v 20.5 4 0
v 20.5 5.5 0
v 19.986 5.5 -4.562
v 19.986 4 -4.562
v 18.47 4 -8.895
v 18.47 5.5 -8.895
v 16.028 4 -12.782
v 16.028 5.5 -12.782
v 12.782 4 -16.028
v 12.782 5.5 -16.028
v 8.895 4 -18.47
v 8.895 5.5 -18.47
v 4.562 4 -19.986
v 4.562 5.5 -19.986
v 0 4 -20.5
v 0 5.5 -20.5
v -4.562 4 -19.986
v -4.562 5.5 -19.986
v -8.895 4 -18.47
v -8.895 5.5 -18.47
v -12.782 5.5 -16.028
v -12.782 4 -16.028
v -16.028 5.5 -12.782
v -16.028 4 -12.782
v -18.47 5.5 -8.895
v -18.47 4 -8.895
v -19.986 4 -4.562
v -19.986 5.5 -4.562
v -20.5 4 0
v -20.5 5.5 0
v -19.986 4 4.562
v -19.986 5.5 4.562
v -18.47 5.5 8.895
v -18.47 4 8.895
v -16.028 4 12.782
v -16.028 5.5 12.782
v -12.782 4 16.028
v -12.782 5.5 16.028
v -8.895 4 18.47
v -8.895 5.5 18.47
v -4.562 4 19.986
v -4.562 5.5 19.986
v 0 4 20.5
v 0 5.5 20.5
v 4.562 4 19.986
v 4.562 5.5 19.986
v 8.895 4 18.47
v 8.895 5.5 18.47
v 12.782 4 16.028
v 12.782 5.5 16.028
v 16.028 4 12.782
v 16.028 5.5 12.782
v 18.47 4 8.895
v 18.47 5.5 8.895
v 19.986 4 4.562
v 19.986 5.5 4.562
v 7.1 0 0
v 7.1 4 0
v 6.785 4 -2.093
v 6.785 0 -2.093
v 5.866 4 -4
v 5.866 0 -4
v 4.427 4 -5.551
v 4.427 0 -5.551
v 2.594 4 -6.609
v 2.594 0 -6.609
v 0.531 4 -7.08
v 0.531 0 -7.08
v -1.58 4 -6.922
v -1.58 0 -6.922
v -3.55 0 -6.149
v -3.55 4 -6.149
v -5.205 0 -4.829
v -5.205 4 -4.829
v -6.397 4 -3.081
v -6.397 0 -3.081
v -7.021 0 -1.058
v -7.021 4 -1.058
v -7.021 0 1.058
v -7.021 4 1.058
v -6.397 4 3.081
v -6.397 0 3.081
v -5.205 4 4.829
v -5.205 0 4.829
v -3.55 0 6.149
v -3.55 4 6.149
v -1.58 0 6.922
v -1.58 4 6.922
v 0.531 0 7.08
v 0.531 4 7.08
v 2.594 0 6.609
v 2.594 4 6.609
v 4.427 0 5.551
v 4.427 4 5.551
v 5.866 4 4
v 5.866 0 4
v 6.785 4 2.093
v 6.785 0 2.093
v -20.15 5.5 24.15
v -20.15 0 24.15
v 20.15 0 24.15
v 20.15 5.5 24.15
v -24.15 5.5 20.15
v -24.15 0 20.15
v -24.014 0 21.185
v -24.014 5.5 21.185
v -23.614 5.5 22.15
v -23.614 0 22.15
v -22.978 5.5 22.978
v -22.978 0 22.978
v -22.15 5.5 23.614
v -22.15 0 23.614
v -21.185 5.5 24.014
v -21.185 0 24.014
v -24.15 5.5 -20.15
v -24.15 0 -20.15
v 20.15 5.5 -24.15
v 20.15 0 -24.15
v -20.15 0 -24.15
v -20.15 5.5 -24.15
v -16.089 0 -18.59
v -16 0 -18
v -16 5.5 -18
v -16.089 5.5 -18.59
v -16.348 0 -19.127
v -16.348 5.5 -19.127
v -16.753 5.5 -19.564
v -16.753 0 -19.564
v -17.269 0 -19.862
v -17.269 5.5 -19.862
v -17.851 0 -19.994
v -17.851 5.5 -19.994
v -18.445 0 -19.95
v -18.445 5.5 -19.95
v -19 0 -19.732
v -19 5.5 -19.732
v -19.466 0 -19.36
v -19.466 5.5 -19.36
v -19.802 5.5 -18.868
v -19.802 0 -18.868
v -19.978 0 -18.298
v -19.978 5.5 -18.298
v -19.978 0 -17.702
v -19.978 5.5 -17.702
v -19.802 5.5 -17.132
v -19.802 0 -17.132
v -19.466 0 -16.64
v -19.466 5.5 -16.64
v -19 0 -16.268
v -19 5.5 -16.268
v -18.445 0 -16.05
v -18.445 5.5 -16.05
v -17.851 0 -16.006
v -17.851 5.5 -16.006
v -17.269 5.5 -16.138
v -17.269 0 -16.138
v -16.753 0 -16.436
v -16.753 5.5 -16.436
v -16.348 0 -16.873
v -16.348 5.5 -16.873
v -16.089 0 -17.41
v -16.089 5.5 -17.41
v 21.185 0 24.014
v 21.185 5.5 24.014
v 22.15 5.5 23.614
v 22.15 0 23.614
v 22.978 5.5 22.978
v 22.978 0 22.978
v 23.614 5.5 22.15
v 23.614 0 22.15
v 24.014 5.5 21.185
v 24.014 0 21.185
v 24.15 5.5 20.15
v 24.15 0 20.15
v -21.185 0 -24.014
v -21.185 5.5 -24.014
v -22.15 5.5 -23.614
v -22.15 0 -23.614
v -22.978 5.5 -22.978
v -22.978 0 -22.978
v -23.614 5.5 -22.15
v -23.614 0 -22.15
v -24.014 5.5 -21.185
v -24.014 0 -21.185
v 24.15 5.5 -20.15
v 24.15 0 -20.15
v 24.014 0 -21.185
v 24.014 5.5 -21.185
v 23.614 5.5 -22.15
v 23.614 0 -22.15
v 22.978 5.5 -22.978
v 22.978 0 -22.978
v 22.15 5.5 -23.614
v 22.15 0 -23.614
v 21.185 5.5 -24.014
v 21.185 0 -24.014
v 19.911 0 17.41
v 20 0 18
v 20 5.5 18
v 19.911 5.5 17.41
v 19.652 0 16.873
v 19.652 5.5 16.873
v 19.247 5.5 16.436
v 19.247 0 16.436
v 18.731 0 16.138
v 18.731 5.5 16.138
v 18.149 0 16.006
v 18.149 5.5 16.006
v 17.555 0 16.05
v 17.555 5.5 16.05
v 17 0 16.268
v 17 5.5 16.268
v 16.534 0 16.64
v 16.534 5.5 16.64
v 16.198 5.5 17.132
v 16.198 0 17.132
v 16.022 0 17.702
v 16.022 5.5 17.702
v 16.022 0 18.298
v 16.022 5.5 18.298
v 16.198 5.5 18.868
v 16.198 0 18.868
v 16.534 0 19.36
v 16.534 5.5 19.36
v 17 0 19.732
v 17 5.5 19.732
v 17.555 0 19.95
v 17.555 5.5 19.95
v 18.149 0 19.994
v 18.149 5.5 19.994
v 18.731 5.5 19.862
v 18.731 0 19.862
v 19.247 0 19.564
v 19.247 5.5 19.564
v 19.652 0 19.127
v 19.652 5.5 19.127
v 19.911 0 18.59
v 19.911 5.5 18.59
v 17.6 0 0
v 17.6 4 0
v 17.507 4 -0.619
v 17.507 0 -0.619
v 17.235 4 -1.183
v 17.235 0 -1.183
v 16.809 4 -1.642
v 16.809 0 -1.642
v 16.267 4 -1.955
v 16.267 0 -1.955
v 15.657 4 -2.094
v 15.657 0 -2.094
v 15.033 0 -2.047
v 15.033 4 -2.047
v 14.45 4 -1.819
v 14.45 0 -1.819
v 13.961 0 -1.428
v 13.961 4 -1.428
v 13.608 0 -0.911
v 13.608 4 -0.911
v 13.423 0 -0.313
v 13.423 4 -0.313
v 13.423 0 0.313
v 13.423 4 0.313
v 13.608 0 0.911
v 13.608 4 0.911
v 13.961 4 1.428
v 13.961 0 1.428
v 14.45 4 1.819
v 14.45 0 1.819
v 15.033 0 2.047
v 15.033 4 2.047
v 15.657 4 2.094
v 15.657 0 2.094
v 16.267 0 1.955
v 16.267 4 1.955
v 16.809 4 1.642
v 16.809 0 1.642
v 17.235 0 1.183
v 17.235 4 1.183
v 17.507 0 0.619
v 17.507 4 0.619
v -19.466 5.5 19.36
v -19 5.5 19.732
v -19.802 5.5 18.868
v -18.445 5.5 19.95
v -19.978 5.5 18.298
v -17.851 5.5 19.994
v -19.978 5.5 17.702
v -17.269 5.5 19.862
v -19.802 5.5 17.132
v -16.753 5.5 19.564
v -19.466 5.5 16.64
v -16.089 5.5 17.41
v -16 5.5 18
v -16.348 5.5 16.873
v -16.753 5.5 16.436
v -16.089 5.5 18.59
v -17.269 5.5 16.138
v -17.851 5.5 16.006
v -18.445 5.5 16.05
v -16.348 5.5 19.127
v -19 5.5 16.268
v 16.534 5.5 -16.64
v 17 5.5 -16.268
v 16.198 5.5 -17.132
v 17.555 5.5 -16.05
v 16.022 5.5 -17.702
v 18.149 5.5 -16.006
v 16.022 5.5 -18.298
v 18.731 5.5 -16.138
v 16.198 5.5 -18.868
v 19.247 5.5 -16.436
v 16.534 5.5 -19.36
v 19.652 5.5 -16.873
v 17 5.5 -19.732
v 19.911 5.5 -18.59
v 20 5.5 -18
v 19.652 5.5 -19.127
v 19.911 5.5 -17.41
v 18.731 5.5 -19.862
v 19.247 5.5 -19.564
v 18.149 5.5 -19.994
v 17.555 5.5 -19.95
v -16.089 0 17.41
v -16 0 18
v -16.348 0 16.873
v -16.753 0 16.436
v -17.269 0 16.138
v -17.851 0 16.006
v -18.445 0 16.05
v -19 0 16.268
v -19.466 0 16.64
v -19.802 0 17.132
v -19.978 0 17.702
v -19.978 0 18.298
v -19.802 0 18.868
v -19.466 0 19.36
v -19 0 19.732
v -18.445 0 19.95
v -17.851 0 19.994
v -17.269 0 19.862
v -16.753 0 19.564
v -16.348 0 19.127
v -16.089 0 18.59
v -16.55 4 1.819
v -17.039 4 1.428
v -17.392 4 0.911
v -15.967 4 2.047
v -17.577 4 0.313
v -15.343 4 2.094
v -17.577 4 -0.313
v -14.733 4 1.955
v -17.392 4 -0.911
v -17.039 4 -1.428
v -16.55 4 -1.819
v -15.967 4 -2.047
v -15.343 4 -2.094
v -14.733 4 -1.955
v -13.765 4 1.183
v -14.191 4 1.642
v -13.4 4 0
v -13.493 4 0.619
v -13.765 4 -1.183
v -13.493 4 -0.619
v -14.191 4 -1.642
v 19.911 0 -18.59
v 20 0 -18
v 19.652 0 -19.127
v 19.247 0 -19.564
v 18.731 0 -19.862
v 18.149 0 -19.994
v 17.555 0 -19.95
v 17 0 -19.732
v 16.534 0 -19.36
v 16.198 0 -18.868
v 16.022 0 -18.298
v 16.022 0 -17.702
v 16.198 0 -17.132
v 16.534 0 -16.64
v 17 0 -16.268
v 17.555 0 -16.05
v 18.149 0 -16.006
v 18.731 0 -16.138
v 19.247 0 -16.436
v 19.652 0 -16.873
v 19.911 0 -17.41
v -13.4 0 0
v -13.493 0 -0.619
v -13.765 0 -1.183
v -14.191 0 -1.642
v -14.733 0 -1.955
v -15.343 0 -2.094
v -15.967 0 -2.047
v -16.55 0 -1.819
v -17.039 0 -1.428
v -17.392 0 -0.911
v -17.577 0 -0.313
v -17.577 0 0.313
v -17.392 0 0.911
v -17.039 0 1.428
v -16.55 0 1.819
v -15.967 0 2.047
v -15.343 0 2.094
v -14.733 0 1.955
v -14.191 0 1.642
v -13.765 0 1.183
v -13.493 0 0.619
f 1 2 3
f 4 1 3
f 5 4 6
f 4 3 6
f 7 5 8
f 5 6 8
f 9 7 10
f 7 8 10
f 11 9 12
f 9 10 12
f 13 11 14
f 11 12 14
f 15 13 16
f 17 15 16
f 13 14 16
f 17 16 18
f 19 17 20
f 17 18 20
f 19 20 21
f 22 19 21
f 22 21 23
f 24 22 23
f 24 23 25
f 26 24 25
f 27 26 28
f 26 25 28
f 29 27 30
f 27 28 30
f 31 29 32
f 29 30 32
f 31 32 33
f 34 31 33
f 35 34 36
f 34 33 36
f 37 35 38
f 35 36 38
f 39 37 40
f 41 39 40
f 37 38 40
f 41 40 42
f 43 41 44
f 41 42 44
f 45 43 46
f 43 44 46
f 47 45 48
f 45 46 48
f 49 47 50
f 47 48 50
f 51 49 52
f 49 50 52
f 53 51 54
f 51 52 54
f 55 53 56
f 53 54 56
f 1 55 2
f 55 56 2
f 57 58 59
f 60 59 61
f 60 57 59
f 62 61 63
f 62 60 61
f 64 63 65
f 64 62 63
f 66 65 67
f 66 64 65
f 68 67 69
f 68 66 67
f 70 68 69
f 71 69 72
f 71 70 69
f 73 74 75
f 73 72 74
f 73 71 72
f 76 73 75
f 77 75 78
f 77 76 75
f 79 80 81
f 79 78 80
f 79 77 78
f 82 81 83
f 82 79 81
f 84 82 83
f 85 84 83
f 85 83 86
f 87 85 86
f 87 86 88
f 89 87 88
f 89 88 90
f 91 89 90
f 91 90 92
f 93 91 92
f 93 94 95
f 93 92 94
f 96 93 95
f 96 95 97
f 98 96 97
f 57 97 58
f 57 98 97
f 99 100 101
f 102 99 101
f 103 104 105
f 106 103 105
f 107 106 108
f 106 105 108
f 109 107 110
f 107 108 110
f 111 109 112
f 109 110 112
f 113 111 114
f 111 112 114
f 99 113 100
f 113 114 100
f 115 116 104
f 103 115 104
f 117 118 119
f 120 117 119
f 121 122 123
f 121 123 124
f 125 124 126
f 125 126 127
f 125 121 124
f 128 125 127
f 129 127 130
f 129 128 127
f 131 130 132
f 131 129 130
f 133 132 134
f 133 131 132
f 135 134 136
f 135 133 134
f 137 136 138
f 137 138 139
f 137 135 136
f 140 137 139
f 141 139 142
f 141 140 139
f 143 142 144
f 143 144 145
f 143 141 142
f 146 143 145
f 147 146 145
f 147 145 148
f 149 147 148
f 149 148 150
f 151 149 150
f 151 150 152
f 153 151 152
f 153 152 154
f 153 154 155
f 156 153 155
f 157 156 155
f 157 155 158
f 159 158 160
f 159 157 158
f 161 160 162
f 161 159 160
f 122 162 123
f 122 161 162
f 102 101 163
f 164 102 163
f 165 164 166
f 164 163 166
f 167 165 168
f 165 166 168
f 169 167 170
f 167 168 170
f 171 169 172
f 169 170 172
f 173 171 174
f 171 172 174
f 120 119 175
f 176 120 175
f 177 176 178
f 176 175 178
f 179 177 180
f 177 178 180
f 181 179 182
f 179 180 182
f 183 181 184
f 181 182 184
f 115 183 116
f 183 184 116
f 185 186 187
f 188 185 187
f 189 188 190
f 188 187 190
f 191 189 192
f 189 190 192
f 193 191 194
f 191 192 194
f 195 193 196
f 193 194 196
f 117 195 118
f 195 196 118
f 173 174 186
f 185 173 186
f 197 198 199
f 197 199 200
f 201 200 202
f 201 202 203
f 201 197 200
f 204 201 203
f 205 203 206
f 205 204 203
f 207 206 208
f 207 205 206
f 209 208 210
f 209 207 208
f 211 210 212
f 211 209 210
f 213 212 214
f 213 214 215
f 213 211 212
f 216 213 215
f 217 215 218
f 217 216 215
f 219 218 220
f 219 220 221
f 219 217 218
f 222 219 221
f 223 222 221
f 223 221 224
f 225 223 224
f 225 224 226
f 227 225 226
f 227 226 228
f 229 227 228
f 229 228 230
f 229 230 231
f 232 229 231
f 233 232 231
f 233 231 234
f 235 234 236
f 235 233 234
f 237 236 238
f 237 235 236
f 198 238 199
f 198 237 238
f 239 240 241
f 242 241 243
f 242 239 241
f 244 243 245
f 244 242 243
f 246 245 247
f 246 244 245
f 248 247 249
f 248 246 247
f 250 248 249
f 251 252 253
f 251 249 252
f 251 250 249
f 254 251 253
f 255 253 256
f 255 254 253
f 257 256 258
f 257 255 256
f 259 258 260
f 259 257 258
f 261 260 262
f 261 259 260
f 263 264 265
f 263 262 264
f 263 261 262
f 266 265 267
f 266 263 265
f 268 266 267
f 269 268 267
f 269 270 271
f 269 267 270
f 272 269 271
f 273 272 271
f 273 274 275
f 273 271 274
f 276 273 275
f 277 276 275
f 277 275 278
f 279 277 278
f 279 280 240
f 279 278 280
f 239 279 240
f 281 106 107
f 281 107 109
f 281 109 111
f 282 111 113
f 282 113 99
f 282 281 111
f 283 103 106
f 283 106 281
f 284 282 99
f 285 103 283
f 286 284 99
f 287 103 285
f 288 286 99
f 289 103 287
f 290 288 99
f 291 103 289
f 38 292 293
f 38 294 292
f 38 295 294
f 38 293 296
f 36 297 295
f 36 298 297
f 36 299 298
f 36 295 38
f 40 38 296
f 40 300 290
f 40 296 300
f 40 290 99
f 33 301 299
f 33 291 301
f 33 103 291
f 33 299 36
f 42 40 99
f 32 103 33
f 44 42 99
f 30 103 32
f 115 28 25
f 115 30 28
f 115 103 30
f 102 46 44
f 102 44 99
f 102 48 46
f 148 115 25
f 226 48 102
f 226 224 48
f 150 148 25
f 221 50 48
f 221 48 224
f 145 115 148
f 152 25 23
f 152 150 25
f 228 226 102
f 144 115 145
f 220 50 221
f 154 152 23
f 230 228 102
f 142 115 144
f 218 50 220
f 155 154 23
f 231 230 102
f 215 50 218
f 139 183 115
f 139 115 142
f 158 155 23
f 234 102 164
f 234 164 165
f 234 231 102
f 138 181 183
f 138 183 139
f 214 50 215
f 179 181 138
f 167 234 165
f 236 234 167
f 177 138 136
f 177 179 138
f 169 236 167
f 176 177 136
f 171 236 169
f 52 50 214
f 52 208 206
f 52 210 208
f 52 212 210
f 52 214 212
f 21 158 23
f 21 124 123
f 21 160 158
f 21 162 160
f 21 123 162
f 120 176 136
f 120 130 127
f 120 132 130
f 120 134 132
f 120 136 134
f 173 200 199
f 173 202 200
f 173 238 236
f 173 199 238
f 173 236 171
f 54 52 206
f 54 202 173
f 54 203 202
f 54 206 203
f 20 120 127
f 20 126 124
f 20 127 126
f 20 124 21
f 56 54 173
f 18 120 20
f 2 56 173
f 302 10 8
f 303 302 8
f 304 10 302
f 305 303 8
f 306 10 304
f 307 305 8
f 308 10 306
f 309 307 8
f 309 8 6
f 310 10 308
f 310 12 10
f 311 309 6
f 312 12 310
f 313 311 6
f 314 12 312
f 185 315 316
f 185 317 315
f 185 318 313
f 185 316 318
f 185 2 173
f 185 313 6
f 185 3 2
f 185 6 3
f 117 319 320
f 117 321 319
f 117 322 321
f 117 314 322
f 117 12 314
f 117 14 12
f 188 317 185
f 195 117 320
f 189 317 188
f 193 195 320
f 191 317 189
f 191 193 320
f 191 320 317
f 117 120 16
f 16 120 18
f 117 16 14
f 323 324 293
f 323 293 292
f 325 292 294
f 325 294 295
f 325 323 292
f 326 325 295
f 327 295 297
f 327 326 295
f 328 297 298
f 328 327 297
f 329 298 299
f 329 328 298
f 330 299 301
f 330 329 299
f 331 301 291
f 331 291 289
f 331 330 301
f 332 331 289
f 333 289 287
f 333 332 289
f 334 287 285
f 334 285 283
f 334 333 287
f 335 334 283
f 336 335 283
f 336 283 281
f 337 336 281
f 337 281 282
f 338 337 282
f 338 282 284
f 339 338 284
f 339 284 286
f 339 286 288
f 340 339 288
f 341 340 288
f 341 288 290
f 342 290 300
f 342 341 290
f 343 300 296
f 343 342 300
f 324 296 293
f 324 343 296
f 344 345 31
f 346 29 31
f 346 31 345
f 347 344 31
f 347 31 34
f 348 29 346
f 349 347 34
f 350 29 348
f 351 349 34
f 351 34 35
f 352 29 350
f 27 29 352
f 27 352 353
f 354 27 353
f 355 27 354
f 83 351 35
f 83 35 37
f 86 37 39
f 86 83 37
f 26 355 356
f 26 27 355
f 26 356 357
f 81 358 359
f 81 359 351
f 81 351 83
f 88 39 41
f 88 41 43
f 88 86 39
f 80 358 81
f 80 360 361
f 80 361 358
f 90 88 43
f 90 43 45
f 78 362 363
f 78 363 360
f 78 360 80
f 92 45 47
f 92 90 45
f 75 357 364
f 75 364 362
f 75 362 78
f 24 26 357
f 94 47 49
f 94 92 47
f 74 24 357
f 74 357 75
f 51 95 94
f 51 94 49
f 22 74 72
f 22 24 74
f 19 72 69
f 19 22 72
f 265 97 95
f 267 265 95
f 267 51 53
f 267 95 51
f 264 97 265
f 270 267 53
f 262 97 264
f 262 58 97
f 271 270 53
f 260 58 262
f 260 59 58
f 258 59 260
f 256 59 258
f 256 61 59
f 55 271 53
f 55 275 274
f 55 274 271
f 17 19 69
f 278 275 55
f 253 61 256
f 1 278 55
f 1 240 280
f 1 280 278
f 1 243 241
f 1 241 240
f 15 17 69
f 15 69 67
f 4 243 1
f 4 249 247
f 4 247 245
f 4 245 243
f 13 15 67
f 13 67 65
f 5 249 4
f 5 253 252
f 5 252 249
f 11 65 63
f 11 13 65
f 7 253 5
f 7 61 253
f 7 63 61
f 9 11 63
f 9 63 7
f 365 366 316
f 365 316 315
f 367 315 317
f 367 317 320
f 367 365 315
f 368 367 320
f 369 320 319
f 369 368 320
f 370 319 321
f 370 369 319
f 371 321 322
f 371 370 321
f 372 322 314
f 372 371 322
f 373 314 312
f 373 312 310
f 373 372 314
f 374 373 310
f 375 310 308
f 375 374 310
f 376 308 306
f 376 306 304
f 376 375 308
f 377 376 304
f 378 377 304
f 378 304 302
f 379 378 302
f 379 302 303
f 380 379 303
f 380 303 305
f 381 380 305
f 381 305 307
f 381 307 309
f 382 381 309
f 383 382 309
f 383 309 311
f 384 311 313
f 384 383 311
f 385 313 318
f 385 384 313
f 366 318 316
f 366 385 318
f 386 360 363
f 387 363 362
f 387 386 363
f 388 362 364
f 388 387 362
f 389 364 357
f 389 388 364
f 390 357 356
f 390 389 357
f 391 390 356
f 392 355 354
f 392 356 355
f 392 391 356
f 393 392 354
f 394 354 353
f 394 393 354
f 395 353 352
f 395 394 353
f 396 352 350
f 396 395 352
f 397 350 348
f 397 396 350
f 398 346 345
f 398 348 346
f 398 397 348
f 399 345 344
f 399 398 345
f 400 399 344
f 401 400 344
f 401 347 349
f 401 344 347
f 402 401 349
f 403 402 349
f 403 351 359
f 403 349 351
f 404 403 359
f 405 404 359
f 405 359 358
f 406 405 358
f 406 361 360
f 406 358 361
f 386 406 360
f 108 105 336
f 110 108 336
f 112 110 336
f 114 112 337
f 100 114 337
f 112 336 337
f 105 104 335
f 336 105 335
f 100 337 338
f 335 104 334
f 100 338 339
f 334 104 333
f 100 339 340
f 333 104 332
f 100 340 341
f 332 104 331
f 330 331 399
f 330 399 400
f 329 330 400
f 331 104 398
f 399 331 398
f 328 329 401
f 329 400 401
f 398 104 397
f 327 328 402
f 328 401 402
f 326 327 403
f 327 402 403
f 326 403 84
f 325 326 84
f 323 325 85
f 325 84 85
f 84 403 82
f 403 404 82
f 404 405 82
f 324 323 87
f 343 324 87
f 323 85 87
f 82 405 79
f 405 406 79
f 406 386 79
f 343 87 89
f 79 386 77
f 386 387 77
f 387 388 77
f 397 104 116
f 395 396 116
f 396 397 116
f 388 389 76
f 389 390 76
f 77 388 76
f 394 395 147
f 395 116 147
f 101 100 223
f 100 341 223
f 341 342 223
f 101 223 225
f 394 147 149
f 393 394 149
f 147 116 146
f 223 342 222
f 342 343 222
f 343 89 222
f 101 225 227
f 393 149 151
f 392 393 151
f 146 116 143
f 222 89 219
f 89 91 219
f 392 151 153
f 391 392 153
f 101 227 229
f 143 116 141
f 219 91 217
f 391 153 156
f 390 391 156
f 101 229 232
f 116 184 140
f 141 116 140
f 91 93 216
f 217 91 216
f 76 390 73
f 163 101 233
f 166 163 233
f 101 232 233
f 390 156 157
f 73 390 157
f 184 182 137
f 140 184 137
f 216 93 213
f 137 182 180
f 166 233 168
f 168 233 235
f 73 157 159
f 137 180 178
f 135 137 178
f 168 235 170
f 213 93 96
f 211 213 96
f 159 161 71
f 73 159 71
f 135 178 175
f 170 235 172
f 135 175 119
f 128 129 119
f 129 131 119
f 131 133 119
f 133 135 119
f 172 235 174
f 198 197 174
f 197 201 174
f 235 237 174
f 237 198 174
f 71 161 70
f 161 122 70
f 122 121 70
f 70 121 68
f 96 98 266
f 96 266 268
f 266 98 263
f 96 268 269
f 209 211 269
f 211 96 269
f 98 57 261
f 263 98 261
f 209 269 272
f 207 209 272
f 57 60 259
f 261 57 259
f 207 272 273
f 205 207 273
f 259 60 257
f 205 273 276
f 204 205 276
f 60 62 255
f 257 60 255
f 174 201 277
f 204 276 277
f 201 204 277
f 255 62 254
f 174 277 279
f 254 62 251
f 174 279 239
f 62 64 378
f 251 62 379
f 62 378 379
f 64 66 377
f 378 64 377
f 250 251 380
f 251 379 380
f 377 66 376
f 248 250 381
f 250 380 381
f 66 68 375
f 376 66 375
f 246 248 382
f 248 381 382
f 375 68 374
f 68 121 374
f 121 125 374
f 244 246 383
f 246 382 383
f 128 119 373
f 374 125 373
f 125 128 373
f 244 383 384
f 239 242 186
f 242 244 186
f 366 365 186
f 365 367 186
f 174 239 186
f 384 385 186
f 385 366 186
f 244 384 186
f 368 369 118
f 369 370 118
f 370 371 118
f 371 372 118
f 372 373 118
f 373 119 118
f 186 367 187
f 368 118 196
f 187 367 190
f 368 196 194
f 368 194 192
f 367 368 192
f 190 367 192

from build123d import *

# Parameters (mm, degrees)
IZIM2_R                     = 7.1
IZIM2_R_2                   = 2
IZIM2_R_3                   = 2.1
Y_KSEKLIK_EKSTR_ZYON1_DEPTH = 5.5
IZIM3_R                     = 20.5
KES_EKSTR_ZYON1_DEPTH       = 1.5


with BuildPart() as part:
    # Çizim2 → Yükseklik-Ekstrüzyon1 (new body)
    with BuildSketch(Plane(origin=(0, 0, 0), x_dir=(1, 0, 0), z_dir=(0, 1, 0))):
        with BuildLine():
            Line((-20.15, -24.15), (20.15, -24.15))
            ThreePointArc((20.15, -24.15), (22.978427125, -22.978427125), (24.15, -20.15))
            Line((24.15, -20.15), (24.15, 20.15))
            ThreePointArc((24.15, 20.15), (22.978427125, 22.978427125), (20.15, 24.15))
            Line((20.15, 24.15), (-20.15, 24.15))
            ThreePointArc((-20.15, 24.15), (-22.978427125, 22.978427125), (-24.15, 20.15))
            Line((-24.15, 20.15), (-24.15, -20.15))
            ThreePointArc((-24.15, -20.15), (-22.978427125, -22.978427125), (-20.15, -24.15))
        make_face()
        Circle(IZIM2_R, mode=Mode.SUBTRACT)
        with Locations((-18, 18)):
            Circle(IZIM2_R_2, mode=Mode.SUBTRACT)
        with Locations((18, 18)):
            Circle(IZIM2_R_2, mode=Mode.SUBTRACT)
        with Locations((-18, -18)):
            Circle(IZIM2_R_2, mode=Mode.SUBTRACT)
        with Locations((18, -18)):
            Circle(IZIM2_R_2, mode=Mode.SUBTRACT)
        with Locations((-15.5, 0)):
            Circle(IZIM2_R_3, mode=Mode.SUBTRACT)
        with Locations((15.5, 0)):
            Circle(IZIM2_R_3, mode=Mode.SUBTRACT)
    extrude(amount=Y_KSEKLIK_EKSTR_ZYON1_DEPTH)

    # Çizim3 → Kes-Ekstrüzyon1 (cut)
    with BuildSketch(Plane(origin=(0, 5.5, 0), x_dir=(1, 0, 0), z_dir=(0, 1, 0))):
        Circle(IZIM3_R)
    extrude(amount=-KES_EKSTR_ZYON1_DEPTH, mode=Mode.SUBTRACT)


solid = part.part
